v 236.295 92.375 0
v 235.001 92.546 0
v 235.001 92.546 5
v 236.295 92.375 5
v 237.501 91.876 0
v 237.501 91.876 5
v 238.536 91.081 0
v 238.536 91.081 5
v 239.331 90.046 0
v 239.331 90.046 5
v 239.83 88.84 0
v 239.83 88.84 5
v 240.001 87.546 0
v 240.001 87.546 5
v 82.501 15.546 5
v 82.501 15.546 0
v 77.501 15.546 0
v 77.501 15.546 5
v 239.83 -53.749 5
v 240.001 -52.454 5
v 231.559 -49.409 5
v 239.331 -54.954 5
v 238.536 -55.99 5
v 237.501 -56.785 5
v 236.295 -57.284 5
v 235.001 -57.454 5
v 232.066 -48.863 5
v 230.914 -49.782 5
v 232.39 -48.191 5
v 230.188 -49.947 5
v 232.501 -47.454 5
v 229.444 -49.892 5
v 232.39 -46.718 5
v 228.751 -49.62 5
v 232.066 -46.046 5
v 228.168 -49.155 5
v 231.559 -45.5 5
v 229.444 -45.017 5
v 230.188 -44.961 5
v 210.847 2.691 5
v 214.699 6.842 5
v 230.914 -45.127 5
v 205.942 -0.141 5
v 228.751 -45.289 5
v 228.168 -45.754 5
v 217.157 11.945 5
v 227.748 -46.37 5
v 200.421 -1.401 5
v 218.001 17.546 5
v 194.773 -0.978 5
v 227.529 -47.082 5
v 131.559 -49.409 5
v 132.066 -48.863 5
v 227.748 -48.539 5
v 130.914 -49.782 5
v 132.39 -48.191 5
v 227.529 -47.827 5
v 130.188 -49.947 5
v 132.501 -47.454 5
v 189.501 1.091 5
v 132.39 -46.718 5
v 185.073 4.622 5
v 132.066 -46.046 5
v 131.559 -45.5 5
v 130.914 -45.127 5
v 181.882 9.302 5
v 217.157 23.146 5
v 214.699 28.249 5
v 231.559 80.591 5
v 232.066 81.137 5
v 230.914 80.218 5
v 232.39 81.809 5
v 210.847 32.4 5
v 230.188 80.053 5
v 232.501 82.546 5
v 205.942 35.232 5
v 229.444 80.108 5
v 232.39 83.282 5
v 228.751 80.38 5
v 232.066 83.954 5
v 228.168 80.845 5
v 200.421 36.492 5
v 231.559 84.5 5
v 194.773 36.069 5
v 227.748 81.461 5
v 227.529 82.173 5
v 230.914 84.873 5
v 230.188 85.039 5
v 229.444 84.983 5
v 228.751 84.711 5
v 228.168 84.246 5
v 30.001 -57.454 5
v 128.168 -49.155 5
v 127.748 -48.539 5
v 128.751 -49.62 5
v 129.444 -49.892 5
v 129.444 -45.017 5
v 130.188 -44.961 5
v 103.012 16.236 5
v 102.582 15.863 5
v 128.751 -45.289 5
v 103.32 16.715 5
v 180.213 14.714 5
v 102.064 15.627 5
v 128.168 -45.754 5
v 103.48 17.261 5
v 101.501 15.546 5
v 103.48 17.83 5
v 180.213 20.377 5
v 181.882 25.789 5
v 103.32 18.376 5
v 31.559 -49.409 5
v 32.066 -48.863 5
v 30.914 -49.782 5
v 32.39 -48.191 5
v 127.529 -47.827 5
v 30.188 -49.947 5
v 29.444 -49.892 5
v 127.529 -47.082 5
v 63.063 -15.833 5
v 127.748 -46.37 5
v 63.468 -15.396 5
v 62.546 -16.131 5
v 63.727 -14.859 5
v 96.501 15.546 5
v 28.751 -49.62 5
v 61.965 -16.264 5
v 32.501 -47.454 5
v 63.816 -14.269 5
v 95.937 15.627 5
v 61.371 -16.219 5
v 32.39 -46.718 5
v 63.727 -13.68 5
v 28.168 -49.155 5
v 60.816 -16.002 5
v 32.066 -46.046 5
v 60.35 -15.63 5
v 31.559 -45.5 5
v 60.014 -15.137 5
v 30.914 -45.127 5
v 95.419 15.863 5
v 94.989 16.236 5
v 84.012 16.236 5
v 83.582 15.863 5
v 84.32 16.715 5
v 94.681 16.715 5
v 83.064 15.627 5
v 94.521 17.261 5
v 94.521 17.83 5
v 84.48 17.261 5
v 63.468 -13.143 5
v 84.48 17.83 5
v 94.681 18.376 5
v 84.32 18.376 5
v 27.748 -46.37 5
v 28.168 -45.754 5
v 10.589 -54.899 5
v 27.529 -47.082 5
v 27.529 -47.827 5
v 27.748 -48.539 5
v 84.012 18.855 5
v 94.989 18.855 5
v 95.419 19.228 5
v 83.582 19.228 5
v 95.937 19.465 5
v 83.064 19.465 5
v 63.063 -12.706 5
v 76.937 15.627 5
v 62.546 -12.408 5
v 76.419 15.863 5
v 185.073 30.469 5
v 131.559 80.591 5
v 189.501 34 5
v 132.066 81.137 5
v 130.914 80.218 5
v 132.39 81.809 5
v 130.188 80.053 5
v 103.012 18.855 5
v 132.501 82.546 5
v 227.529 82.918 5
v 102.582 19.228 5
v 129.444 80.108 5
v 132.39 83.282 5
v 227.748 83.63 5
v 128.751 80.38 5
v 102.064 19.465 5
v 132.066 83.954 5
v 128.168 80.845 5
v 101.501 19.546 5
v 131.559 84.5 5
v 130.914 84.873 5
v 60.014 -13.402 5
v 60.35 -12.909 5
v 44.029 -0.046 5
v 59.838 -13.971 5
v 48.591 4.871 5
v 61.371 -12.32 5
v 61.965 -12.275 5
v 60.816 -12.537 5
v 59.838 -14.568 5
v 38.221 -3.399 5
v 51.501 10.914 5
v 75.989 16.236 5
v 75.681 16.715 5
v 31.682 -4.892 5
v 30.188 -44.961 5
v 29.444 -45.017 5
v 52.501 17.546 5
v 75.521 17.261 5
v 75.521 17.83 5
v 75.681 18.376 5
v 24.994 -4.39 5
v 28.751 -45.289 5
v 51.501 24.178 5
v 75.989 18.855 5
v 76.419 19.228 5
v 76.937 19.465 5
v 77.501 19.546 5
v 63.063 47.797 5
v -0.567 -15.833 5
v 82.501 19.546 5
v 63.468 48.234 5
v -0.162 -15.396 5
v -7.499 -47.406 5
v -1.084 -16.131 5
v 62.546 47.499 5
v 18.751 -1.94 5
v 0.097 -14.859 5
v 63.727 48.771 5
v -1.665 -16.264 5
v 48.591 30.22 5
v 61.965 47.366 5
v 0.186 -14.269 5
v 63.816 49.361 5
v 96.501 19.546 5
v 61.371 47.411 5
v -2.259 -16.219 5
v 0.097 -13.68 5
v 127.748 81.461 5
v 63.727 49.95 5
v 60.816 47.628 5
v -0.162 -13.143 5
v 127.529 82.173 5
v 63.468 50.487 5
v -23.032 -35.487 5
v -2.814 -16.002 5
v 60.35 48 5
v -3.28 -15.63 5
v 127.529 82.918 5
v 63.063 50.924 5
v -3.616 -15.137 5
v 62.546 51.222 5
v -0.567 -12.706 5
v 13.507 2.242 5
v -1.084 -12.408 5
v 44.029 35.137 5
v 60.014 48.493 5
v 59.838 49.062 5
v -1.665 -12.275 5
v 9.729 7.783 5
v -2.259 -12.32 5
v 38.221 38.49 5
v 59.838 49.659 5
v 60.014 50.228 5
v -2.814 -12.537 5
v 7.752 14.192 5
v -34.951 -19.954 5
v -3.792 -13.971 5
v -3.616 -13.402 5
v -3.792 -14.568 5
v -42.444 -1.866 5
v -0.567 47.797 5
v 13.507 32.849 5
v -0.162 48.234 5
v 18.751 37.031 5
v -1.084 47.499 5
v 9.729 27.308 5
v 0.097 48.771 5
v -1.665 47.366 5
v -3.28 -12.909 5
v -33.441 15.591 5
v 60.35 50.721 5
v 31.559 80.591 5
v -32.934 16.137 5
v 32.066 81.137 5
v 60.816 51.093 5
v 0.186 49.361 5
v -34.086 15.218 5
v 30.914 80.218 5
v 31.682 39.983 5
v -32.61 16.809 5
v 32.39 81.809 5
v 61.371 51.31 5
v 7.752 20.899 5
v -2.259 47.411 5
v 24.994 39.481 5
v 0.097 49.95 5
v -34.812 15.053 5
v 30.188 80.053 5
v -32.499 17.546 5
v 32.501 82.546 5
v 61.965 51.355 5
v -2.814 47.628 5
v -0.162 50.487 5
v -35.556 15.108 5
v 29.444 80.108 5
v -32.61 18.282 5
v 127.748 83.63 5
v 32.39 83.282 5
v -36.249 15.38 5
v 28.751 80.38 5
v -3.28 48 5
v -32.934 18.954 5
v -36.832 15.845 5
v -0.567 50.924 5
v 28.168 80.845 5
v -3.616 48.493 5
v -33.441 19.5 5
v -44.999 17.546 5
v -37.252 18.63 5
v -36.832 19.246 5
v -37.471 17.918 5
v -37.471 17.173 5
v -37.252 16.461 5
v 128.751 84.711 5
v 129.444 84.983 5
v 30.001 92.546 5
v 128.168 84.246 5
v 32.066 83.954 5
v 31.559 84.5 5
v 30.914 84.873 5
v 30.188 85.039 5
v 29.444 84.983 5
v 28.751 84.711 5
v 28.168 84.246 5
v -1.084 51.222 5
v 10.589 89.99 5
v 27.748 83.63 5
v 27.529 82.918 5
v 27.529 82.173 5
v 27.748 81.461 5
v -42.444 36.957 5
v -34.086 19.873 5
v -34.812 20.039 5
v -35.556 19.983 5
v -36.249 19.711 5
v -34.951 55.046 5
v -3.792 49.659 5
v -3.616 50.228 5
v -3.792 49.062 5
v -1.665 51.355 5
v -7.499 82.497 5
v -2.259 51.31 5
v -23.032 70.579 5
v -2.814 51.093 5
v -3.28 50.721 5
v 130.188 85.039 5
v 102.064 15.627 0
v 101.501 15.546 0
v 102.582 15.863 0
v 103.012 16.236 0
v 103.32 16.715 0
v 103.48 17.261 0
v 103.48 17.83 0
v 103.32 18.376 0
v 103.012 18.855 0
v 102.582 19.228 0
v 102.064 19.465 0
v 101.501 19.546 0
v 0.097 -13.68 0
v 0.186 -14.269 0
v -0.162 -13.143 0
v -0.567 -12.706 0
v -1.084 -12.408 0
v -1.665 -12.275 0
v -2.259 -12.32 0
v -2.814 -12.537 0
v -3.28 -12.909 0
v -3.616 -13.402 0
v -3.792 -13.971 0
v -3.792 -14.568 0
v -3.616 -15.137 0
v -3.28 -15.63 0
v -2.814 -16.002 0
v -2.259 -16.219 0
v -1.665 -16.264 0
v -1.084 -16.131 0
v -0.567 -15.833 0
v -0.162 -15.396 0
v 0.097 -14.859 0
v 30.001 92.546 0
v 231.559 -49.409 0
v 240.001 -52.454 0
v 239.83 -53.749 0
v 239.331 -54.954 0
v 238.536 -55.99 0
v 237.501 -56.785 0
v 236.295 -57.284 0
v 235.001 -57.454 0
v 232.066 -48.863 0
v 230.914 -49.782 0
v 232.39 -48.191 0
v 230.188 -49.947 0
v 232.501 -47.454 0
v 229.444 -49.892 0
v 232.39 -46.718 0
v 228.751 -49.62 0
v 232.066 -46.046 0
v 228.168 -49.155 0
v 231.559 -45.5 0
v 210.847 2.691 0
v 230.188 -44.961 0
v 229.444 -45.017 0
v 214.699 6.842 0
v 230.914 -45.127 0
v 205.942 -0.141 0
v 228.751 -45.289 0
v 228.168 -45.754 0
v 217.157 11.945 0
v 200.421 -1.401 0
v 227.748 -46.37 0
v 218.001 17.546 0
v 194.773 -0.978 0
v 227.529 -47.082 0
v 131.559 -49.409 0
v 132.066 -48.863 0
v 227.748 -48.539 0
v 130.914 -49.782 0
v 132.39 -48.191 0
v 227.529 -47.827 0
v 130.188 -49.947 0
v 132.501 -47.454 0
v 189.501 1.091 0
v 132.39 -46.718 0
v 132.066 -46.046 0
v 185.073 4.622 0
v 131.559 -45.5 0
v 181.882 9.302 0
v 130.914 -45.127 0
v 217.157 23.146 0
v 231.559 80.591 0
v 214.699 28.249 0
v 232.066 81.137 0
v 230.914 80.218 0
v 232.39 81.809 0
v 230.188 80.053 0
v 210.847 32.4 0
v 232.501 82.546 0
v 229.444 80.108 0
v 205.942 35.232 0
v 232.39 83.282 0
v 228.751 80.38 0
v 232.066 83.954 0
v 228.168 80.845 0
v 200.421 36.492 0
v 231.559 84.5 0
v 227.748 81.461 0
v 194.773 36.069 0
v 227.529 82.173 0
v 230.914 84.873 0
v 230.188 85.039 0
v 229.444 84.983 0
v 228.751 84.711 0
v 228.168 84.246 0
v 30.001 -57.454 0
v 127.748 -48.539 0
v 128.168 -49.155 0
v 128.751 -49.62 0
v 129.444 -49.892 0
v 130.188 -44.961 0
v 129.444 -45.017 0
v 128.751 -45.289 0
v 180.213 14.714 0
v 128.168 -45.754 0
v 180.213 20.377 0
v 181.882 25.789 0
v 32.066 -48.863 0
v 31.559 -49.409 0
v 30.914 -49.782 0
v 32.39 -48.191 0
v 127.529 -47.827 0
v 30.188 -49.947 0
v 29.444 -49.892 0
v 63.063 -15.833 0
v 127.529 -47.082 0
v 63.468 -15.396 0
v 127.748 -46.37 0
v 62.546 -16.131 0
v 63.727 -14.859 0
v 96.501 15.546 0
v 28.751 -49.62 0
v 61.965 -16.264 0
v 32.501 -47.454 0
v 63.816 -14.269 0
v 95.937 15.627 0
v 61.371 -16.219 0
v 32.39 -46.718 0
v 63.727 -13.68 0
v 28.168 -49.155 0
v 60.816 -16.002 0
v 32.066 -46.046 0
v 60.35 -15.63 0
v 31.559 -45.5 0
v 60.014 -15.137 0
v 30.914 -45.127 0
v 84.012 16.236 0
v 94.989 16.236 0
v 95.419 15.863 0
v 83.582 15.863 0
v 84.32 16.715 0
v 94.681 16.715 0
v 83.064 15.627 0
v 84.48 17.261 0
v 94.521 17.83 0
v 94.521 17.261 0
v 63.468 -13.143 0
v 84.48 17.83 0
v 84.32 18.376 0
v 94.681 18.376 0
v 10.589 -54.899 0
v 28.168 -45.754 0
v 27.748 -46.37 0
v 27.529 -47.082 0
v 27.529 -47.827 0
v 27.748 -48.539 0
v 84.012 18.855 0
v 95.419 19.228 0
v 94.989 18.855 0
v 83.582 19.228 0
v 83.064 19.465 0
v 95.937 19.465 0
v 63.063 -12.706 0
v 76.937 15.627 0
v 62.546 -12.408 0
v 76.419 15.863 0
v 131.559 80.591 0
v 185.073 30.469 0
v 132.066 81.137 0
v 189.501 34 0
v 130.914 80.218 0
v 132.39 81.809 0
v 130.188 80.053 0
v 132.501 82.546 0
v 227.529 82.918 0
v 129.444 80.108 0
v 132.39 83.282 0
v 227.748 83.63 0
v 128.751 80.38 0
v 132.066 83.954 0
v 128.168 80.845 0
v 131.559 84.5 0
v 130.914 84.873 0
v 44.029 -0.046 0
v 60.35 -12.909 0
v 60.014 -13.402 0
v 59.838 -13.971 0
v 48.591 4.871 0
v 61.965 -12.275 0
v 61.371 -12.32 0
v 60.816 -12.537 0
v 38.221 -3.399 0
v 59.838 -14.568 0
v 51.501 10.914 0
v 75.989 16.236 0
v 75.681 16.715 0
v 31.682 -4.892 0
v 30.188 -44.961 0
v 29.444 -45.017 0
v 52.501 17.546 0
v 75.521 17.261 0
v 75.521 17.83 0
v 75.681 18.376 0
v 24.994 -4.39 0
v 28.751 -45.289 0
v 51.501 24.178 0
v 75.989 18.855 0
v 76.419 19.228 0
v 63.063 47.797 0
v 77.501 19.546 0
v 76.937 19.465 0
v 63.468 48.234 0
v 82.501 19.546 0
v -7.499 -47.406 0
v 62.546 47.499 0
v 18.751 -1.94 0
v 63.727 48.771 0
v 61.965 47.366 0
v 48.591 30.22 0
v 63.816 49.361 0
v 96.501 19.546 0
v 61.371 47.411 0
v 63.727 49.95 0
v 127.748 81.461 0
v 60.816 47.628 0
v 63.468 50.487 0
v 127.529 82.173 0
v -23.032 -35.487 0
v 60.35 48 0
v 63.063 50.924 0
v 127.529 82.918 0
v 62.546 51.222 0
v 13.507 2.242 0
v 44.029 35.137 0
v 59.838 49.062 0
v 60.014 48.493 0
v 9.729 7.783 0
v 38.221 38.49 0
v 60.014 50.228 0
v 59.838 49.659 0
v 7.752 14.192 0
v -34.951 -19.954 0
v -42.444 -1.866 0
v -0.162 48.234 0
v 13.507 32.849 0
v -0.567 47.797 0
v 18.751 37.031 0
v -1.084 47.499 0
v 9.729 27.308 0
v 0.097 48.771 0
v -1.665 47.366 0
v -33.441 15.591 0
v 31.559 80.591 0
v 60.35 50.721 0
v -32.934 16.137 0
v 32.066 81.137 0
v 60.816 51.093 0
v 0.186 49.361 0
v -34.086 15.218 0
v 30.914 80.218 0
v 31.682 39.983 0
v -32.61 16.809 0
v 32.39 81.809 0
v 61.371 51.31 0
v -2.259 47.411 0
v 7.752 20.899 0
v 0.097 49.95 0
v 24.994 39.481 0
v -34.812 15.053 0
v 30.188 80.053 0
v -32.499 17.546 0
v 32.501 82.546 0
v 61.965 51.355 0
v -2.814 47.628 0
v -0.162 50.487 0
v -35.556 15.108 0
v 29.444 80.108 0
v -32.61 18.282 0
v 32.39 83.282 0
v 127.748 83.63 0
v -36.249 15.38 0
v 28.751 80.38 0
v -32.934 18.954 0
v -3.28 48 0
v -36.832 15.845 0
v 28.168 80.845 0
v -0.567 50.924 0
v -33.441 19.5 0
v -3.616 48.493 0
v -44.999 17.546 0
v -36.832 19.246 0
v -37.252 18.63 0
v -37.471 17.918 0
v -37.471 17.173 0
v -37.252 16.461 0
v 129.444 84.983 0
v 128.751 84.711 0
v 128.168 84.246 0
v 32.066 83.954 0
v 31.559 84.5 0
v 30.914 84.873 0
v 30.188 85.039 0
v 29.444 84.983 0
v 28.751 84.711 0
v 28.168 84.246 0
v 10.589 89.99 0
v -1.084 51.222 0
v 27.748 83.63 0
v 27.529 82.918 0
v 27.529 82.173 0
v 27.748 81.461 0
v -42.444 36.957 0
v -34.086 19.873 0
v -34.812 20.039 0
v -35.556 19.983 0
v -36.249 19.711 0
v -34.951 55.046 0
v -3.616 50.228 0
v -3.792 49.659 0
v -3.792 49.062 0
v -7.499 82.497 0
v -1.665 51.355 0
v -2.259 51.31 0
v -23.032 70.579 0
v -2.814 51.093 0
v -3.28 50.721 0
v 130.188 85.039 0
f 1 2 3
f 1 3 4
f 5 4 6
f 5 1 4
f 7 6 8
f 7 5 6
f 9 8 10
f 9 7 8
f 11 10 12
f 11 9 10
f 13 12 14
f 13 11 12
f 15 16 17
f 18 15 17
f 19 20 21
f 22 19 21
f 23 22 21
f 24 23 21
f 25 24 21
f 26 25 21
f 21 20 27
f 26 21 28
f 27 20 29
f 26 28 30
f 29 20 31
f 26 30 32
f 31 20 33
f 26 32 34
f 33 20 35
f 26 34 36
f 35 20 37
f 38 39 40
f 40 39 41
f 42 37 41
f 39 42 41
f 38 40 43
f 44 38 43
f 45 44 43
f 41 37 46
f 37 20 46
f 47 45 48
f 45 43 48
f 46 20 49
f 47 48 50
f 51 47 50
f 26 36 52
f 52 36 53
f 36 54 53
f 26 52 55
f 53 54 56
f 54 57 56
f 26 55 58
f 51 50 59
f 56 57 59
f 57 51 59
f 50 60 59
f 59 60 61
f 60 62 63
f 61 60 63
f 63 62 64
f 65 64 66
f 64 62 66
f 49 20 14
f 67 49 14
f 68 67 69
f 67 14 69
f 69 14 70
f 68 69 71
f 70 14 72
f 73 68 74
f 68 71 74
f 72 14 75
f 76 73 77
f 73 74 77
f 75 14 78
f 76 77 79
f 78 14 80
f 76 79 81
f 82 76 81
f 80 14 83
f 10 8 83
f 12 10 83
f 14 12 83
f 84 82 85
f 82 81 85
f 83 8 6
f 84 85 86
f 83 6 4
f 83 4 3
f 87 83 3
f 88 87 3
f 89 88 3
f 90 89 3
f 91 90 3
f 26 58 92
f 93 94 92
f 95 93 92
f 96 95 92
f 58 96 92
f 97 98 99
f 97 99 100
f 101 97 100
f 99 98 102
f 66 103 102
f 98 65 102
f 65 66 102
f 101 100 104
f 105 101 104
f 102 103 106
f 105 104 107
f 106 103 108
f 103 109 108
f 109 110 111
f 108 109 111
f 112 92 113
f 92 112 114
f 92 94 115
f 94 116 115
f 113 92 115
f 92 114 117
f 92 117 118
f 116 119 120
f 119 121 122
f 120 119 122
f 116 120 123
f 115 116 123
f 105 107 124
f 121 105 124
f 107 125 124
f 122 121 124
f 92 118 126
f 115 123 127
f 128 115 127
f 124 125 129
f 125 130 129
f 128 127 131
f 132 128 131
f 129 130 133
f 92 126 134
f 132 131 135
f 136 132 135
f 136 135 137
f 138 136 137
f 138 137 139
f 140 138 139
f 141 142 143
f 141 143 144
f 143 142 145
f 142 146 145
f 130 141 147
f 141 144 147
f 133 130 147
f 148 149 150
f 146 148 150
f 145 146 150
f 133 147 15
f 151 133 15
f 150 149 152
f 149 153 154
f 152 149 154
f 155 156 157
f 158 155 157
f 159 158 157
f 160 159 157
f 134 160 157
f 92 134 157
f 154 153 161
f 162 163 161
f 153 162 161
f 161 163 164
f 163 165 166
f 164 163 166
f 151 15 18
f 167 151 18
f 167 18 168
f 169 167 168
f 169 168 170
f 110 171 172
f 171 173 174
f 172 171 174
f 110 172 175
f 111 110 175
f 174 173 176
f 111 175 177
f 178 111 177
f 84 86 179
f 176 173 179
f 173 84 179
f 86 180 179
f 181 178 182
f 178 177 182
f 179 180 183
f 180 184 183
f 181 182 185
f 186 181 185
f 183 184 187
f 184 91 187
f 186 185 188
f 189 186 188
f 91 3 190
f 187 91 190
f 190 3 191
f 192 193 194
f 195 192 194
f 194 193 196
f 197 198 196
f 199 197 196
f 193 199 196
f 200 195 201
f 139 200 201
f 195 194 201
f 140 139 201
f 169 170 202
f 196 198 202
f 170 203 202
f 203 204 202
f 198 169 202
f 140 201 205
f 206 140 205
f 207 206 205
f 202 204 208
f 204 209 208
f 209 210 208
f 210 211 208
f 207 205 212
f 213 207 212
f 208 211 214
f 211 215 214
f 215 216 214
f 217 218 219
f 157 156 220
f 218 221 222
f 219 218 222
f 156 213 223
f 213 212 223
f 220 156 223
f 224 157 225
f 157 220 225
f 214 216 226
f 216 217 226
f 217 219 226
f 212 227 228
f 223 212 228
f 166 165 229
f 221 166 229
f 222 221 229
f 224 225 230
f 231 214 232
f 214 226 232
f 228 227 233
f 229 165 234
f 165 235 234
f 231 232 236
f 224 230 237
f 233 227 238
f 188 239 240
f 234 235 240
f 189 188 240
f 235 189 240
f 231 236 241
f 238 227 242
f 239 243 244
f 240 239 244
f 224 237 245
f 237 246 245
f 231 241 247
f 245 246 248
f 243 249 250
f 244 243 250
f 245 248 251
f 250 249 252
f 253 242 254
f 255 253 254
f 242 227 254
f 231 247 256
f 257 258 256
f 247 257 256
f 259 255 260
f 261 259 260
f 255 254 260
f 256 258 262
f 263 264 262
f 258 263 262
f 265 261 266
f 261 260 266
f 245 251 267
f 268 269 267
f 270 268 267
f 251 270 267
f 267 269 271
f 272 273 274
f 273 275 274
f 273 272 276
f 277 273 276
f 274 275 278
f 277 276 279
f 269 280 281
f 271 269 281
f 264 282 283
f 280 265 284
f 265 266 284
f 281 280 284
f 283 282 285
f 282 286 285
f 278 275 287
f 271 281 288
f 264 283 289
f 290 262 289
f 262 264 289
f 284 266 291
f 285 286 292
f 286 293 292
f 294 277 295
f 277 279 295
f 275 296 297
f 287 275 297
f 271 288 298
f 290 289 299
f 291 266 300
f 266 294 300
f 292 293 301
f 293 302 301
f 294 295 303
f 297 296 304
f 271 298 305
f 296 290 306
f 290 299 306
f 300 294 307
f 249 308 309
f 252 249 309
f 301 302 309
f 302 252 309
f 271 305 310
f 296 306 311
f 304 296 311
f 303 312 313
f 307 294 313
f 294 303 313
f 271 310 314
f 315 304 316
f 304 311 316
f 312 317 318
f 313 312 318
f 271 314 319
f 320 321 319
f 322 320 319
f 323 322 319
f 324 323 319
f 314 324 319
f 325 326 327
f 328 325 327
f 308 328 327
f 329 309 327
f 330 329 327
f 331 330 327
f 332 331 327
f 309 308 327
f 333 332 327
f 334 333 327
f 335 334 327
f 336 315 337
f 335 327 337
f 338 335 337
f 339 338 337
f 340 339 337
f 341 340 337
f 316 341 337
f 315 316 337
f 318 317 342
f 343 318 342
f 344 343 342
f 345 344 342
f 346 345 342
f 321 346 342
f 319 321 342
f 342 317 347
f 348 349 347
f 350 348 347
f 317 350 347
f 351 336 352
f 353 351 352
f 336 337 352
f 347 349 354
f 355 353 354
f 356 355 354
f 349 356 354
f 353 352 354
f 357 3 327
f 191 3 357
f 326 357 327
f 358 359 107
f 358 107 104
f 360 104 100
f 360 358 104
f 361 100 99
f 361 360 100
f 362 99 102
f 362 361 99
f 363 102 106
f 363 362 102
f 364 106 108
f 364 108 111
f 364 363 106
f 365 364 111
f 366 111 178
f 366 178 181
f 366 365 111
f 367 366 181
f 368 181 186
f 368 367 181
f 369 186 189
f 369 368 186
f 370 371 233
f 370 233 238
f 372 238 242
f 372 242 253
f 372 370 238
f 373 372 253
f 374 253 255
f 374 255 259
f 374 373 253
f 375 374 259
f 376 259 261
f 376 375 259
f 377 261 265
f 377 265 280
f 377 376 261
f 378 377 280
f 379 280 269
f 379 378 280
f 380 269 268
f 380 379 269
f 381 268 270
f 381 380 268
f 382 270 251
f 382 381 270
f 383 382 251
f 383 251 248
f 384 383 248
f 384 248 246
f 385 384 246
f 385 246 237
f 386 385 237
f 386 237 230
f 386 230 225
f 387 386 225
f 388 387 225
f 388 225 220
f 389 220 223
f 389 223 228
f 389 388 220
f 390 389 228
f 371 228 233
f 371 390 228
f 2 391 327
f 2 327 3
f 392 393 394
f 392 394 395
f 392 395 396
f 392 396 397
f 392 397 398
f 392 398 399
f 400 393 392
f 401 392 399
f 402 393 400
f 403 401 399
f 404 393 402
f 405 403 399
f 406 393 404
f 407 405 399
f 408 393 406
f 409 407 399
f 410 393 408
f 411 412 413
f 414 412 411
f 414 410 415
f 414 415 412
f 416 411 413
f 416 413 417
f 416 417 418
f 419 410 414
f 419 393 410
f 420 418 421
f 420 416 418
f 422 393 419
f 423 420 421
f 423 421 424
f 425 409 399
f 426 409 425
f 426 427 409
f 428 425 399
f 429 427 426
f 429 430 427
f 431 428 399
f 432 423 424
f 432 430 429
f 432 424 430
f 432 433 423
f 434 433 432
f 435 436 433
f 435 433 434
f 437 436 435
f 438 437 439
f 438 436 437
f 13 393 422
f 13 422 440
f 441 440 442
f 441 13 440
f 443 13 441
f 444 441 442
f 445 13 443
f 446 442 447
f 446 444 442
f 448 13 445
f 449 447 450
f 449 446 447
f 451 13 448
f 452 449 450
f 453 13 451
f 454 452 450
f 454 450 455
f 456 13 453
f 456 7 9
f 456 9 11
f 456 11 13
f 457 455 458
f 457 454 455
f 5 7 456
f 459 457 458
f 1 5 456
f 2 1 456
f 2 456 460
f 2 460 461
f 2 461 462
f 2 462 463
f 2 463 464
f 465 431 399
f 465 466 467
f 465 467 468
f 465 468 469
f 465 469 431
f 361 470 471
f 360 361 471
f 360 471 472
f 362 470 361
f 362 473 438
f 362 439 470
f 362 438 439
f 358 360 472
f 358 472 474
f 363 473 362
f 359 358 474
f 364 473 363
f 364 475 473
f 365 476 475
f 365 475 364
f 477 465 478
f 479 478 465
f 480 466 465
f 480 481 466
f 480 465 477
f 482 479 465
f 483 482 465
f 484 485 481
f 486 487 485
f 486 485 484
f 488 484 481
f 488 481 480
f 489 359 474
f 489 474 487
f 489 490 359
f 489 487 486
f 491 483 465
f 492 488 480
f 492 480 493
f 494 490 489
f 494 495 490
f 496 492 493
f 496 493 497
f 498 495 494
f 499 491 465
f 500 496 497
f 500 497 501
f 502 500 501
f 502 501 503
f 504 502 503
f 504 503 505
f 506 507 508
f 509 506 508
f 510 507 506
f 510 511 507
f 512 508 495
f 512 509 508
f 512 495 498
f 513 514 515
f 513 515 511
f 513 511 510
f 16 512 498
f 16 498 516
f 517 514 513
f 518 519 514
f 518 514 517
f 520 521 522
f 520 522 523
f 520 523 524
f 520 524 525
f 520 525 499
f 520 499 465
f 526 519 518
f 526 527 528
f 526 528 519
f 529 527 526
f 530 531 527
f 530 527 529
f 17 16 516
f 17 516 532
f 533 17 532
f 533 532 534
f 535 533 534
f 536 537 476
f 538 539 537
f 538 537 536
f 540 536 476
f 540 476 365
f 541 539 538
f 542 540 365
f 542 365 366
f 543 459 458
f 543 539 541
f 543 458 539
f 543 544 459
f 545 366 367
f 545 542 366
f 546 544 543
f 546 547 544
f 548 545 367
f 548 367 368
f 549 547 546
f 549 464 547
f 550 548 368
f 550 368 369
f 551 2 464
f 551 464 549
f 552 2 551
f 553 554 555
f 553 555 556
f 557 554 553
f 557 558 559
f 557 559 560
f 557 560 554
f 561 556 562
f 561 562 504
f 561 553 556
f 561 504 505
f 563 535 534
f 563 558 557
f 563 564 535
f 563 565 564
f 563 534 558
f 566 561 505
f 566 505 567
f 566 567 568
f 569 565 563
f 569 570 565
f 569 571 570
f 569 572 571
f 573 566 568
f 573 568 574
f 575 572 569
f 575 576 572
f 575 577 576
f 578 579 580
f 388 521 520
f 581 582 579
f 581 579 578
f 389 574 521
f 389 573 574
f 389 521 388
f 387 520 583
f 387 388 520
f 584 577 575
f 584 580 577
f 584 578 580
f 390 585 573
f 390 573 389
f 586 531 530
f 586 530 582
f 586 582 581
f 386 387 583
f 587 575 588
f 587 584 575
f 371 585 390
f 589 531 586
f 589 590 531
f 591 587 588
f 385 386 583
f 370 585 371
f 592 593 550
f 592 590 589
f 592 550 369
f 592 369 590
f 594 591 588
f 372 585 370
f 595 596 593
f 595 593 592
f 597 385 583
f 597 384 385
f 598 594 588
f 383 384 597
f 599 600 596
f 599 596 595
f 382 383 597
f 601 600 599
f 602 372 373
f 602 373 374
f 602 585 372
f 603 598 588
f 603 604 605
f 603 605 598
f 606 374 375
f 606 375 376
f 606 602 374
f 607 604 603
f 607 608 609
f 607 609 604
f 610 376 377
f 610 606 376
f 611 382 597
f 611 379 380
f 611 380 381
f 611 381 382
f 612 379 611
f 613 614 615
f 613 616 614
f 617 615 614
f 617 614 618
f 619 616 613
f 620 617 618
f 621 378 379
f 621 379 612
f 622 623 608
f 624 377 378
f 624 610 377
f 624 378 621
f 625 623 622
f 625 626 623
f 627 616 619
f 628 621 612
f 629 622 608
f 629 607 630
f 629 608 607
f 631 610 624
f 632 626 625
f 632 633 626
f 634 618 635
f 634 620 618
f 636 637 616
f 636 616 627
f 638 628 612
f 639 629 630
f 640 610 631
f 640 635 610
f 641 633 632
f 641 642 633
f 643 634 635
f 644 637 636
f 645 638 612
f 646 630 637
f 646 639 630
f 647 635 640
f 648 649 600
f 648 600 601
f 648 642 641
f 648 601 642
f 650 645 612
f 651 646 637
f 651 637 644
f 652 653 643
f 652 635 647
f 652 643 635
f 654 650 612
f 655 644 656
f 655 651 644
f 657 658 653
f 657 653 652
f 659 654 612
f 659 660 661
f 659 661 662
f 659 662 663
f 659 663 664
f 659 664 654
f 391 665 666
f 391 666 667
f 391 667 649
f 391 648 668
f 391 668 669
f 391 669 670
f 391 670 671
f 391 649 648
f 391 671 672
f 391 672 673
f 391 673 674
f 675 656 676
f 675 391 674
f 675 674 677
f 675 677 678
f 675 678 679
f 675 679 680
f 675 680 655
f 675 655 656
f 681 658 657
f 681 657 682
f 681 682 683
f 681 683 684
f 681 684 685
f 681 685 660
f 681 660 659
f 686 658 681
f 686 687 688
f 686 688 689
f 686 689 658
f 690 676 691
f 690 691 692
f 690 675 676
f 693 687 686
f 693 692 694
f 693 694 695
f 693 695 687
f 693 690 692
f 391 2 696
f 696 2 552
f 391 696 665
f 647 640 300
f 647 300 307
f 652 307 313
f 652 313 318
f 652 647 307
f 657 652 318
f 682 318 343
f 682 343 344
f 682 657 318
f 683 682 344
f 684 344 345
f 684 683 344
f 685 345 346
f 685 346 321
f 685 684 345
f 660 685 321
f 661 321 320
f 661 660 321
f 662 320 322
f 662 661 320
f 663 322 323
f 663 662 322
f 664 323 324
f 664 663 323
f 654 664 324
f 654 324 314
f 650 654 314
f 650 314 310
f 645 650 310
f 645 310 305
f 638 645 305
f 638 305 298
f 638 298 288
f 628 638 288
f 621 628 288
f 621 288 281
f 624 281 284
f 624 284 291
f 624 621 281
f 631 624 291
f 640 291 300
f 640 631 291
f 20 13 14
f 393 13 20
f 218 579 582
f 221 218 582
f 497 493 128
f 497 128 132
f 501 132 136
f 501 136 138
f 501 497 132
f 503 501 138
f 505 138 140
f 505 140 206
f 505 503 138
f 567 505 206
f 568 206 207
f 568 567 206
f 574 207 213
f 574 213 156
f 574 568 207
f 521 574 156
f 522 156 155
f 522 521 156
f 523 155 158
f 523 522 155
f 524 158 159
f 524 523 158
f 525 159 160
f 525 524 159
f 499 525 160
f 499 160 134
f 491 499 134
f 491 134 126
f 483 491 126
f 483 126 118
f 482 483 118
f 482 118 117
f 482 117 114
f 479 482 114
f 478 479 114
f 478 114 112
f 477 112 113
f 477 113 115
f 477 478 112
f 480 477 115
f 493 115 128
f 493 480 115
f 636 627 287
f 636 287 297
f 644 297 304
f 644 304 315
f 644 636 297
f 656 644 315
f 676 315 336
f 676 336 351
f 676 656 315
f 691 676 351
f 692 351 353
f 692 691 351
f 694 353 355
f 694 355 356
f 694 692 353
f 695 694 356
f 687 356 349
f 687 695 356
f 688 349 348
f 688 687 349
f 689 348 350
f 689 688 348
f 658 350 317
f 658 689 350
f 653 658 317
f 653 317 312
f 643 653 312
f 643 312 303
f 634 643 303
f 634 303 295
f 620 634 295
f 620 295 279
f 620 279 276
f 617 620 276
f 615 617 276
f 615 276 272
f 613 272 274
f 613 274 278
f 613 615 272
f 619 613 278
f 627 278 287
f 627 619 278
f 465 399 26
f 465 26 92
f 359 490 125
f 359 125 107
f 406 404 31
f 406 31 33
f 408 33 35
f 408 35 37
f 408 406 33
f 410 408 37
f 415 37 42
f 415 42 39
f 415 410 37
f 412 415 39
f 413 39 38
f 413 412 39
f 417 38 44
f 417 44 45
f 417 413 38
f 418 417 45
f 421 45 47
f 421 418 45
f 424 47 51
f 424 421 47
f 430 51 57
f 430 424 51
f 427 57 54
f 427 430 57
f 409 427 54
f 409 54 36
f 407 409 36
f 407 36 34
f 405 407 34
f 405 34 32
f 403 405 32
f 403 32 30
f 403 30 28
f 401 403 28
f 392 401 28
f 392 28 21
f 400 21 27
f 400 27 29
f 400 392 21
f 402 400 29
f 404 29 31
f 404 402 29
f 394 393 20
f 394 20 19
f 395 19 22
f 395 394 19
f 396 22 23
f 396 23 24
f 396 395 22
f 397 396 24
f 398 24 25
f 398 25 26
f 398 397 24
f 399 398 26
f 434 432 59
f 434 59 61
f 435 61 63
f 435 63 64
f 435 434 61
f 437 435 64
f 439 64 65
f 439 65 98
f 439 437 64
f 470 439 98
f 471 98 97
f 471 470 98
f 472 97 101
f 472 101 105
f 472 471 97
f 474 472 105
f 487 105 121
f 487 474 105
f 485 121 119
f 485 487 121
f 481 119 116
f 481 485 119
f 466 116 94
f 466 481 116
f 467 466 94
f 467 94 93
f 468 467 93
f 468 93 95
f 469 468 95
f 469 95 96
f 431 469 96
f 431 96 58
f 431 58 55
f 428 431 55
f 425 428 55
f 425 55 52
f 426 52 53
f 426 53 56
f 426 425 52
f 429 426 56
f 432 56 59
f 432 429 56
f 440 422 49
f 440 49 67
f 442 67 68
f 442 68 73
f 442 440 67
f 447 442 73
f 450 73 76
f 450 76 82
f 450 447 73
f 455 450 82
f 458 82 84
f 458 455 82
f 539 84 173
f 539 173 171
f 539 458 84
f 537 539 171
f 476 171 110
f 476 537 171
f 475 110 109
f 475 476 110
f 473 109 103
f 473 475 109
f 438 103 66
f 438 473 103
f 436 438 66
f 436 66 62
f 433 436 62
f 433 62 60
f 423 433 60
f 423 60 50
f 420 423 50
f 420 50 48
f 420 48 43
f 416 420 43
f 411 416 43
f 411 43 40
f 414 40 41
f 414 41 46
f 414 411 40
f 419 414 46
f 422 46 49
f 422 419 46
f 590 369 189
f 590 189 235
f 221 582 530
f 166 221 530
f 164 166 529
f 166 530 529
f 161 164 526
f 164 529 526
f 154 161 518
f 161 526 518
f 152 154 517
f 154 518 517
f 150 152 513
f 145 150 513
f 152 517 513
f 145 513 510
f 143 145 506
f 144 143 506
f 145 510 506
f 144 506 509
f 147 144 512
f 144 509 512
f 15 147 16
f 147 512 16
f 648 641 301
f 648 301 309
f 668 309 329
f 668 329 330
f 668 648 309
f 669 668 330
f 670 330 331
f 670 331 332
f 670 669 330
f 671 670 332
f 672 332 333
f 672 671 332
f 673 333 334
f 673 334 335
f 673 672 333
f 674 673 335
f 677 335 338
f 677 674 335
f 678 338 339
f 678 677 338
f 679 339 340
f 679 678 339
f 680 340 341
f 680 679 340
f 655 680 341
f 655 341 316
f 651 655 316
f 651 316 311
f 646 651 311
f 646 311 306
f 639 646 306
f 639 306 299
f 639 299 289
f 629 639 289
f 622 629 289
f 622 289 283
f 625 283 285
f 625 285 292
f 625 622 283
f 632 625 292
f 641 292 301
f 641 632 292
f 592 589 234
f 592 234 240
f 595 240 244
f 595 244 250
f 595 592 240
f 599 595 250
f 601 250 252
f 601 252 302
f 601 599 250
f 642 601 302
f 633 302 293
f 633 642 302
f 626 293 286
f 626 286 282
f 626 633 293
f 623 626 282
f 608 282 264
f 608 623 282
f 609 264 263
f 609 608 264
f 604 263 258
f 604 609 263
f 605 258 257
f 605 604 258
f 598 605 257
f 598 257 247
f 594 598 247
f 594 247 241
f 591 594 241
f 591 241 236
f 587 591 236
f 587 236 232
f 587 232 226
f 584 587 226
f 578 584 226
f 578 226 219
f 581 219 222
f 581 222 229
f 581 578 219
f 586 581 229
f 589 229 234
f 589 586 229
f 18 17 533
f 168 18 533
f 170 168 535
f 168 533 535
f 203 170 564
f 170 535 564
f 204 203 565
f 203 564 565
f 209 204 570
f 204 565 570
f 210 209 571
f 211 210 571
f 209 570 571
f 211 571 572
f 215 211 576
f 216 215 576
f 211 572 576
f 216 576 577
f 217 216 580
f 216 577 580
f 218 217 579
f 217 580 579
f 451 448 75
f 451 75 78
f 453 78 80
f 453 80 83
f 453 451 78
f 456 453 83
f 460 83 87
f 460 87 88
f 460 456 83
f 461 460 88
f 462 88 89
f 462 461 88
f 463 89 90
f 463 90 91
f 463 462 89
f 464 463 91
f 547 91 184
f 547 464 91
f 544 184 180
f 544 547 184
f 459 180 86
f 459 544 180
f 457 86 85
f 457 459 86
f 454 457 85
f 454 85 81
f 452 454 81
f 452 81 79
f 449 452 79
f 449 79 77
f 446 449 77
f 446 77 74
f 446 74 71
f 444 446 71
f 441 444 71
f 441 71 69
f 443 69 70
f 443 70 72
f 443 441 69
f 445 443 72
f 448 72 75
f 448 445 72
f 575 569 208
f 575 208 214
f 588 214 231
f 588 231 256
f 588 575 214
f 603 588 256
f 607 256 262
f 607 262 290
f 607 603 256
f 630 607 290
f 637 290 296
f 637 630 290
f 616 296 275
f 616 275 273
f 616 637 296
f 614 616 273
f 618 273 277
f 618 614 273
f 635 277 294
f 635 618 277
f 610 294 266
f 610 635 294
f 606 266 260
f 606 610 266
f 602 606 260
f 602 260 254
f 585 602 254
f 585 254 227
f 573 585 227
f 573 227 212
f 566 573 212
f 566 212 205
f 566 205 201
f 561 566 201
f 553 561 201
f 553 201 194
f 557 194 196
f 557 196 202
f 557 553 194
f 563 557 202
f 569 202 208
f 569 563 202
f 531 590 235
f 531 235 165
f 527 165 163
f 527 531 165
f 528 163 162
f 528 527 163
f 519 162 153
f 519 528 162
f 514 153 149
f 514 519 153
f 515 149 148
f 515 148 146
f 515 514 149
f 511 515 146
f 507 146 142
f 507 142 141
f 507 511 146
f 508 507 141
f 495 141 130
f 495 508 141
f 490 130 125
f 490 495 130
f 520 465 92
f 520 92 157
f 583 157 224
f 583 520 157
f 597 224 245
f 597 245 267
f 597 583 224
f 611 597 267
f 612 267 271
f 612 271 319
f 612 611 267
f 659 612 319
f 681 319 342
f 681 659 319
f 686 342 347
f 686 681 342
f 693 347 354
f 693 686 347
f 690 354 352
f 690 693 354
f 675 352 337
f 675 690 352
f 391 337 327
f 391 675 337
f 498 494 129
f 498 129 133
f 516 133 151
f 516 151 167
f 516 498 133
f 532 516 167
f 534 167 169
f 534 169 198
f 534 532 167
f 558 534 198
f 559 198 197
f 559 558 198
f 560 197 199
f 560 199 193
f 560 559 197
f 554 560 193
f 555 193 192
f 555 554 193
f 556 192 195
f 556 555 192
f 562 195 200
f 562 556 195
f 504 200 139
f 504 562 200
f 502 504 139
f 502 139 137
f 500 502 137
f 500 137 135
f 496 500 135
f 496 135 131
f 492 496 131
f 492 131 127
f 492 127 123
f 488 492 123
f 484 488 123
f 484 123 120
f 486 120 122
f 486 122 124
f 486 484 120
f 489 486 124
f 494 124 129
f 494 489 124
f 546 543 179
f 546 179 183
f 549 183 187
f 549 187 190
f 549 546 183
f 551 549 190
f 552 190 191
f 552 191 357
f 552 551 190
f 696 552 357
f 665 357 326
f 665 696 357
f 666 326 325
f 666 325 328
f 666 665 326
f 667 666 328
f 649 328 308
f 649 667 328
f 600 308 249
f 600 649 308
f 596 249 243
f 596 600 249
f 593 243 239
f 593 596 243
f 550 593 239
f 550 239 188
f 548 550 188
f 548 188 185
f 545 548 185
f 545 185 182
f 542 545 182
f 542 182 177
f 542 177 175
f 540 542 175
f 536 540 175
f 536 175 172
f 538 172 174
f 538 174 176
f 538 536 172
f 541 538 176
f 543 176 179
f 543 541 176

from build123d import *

# Parameters (mm, degrees)
SKETCH1_R           = 2.5
SKETCH1_R_2         = 19
SKETCH1_R_3         = 22.5
SKETCH1_R_4         = 2
BOSS_EXTRUDE1_DEPTH = 5


with BuildPart() as part:
    # Sketch1 → Boss-Extrude1 (new body)
    with BuildSketch(Plane.XY):
        with BuildLine():
            Line((30.000692042, 92.545526446), (235.000692042, 92.545526446))
            ThreePointArc((235.000692042, 92.545526446), (238.536225947, 91.081060352), (240.000692042, 87.545526446))
            Line((240.000692042, 87.545526446), (240.000692042, -52.454473554))
            ThreePointArc((240.000692042, -52.454473554), (238.536225947, -55.99000746), (235.000692042, -57.454473554))
            Line((235.000692042, -57.454473554), (30.000692042, -57.454473554))
            ThreePointArc((30.000692042, -57.454473554), (-44.999307958, 17.545526446), (30.000692042, 92.545526446))
        make_face()
        with Locations((-34.999307958, 17.545526446)):
            Circle(SKETCH1_R, mode=Mode.SUBTRACT)
        with Locations((30.000692042, -47.454473554)):
            Circle(SKETCH1_R, mode=Mode.SUBTRACT)
        with Locations((30.000692042, 82.545526446)):
            Circle(SKETCH1_R, mode=Mode.SUBTRACT)
        with Locations((230.000692042, -47.454473554)):
            Circle(SKETCH1_R, mode=Mode.SUBTRACT)
        with Locations((230.000692042, 82.545526446)):
            Circle(SKETCH1_R, mode=Mode.SUBTRACT)
        with Locations((130.000692042, 82.545526446)):
            Circle(SKETCH1_R, mode=Mode.SUBTRACT)
        with Locations((130.000692042, -47.454473554)):
            Circle(SKETCH1_R, mode=Mode.SUBTRACT)
        with Locations((199.000692042, 17.545526446)):
            Circle(SKETCH1_R_2, mode=Mode.SUBTRACT)
        with Locations((30.000692042, 17.545526446)):
            Circle(SKETCH1_R_3, mode=Mode.SUBTRACT)
        with Locations((61.815692042, 49.360526446)):
            Circle(SKETCH1_R_4, mode=Mode.SUBTRACT)
        with Locations((61.815692042, -14.269473554)):
            Circle(SKETCH1_R_4, mode=Mode.SUBTRACT)
        with Locations((-1.814307958, -14.269473554)):
            Circle(SKETCH1_R_4, mode=Mode.SUBTRACT)
        with Locations((-1.814307958, 49.360526446)):
            Circle(SKETCH1_R_4, mode=Mode.SUBTRACT)
        with BuildLine():
            Line((77.500692042, 19.545526446), (82.500692042, 19.545526446))
            ThreePointArc((82.500692042, 19.545526446), (84.500692042, 17.545526446), (82.500692042, 15.545526446))
            Line((82.500692042, 15.545526446), (77.500692042, 15.545526446))
            ThreePointArc((77.500692042, 15.545526446), (75.500692042, 17.545526446), (77.500692042, 19.545526446))
        make_face(mode=Mode.SUBTRACT)
        with BuildLine():
            Line((101.500692042, 19.545526446), (96.500692042, 19.545526446))
            ThreePointArc((96.500692042, 19.545526446), (94.500692042, 17.545526446), (96.500692042, 15.545526446))
            Line((96.500692042, 15.545526446), (101.500692042, 15.545526446))
            ThreePointArc((101.500692042, 15.545526446), (103.500692042, 17.545526446), (101.500692042, 19.545526446))
        make_face(mode=Mode.SUBTRACT)
    extrude(amount=BOSS_EXTRUDE1_DEPTH)


solid = part.part
